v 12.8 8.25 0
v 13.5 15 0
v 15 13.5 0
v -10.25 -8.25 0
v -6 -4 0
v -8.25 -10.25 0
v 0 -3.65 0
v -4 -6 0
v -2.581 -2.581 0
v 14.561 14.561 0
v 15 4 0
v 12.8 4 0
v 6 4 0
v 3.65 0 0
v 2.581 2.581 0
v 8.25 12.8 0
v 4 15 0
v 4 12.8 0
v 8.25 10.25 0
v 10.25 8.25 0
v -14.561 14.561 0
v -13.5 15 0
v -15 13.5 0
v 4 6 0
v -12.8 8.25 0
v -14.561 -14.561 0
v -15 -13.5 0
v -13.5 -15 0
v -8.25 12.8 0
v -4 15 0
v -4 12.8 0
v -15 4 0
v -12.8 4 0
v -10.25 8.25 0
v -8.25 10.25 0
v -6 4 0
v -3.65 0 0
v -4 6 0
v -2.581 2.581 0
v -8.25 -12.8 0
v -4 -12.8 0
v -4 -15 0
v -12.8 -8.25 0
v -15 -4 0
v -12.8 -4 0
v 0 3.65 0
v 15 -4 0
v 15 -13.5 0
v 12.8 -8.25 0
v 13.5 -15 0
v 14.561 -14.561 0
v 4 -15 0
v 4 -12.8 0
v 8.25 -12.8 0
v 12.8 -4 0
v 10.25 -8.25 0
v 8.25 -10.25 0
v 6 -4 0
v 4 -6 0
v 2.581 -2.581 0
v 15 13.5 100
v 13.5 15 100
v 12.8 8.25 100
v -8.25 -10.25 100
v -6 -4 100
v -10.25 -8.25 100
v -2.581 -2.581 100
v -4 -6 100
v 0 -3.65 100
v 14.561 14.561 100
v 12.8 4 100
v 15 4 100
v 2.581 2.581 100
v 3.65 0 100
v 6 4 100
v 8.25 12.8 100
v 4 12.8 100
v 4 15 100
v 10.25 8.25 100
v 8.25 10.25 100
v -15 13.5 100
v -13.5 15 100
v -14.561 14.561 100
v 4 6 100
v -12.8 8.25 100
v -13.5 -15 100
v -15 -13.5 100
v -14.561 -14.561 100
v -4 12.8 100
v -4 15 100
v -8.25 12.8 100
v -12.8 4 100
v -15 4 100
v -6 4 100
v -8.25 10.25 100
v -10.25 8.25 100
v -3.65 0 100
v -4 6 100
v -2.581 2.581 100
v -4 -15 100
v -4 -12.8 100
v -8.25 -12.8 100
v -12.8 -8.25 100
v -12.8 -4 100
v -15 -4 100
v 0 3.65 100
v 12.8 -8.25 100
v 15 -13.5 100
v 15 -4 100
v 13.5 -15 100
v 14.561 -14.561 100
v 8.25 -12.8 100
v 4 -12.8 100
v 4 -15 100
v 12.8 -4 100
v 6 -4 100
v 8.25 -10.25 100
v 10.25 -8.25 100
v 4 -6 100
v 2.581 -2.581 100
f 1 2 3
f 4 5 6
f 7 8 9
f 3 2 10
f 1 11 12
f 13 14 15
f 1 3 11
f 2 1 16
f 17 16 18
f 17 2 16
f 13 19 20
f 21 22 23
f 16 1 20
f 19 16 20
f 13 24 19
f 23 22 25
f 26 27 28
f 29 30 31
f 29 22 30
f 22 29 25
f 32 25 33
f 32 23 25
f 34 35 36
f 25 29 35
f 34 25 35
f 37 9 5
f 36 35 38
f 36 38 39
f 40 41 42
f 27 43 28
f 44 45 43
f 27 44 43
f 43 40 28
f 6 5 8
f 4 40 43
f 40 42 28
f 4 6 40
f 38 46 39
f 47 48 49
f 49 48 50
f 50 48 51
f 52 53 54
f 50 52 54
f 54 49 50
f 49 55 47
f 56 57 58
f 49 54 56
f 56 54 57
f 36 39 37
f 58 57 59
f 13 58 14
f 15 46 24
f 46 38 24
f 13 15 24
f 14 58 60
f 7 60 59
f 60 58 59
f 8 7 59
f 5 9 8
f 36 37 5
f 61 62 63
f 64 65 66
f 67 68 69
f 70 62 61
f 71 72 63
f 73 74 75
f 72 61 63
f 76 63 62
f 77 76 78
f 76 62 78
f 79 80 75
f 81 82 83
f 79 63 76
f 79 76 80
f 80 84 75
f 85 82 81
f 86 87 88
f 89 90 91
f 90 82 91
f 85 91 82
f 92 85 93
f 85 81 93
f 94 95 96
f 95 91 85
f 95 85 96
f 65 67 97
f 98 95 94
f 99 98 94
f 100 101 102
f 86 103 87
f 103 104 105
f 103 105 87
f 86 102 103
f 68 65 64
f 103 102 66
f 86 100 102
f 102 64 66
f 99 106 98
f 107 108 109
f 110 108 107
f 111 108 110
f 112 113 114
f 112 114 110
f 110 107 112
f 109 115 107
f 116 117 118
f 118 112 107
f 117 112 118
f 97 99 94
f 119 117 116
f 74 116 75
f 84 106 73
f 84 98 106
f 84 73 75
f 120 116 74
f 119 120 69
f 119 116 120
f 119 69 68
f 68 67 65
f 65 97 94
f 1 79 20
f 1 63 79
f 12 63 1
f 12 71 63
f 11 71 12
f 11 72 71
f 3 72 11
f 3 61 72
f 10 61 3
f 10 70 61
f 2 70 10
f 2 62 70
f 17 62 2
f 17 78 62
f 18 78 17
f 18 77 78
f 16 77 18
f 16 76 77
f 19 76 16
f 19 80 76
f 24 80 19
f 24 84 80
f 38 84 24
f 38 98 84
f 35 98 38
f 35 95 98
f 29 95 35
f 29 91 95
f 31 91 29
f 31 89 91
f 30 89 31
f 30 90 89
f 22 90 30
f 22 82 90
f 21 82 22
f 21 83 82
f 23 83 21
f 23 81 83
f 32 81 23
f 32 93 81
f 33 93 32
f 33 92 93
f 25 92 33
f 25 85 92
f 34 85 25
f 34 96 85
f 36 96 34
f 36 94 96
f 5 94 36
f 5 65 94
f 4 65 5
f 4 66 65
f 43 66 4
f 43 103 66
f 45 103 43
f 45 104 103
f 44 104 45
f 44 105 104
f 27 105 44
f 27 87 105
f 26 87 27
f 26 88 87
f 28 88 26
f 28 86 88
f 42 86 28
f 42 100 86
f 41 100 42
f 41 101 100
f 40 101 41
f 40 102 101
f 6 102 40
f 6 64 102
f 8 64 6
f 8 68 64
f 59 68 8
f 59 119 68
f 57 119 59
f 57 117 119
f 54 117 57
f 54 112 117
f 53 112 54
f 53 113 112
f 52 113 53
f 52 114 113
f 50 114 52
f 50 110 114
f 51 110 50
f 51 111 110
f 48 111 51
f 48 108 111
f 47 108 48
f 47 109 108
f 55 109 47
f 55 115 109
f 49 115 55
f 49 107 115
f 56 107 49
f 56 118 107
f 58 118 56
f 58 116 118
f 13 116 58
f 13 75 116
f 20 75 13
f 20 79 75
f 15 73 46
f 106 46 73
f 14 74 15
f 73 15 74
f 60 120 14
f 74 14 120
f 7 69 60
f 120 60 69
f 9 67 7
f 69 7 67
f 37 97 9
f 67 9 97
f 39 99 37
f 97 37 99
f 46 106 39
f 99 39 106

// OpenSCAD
// Aleksandr Saechnikov 09 june 2015

ALU_profile(height=100, size=30);

module ALU_profile(size=30, height=10, radius=1.5, step=0) {

	linear_extrude(height=height) {
		union() {
			sub_extrusion_profile(size, radius, step);
			rotate([0,0,90])  sub_extrusion_profile(size, radius, step);
			rotate([0,0,180]) sub_extrusion_profile(size, radius, step);
			rotate([0,0,270]) sub_extrusion_profile(size, radius, step);
		}
	}
    
    module sub_extrusion_profile(size=30, radius = 1.5, step=0.5) {

        reSize = size/30; // Scalling

        k0 = 0;
        k2 = 3.65*reSize;
        k1 = k2*cos(45);

        k3 = 4*reSize;
        k4 = 6*reSize;
        k5 = 8.25*reSize; k5_2 = k5 + k4 - k3;
        k6 = 12.8*reSize;
        k7 = 15*reSize;

        _radius = radius;// OR  *reSize -- Corner radius
        _step = step;    // OR  *reSize -- Step size

        polygon(points=[
            [k1,k1],[0,k2], // Center hole
            [0,k4],[k3,k4],[k5,k5_2],[k5,k6],[k3,k6],
            [k3,k7-_step],[k3+_step,k7-_step],[k3+_step,k7], //Step
            [k7-_radius,k7],[k7-_radius*(1.-cos(45)),k7-_radius*(1.-cos(45))],[k7,k7-_radius],// Corner
            [k7,k3+_step],[k7-_step,k3+_step],[k7-_step,k3], // Step
            [k6,k3],[k6,k5],[k5_2,k5],[k4,k3],[k4,0],
            [k2,0]  // Center hole
        ]);
    }
}
